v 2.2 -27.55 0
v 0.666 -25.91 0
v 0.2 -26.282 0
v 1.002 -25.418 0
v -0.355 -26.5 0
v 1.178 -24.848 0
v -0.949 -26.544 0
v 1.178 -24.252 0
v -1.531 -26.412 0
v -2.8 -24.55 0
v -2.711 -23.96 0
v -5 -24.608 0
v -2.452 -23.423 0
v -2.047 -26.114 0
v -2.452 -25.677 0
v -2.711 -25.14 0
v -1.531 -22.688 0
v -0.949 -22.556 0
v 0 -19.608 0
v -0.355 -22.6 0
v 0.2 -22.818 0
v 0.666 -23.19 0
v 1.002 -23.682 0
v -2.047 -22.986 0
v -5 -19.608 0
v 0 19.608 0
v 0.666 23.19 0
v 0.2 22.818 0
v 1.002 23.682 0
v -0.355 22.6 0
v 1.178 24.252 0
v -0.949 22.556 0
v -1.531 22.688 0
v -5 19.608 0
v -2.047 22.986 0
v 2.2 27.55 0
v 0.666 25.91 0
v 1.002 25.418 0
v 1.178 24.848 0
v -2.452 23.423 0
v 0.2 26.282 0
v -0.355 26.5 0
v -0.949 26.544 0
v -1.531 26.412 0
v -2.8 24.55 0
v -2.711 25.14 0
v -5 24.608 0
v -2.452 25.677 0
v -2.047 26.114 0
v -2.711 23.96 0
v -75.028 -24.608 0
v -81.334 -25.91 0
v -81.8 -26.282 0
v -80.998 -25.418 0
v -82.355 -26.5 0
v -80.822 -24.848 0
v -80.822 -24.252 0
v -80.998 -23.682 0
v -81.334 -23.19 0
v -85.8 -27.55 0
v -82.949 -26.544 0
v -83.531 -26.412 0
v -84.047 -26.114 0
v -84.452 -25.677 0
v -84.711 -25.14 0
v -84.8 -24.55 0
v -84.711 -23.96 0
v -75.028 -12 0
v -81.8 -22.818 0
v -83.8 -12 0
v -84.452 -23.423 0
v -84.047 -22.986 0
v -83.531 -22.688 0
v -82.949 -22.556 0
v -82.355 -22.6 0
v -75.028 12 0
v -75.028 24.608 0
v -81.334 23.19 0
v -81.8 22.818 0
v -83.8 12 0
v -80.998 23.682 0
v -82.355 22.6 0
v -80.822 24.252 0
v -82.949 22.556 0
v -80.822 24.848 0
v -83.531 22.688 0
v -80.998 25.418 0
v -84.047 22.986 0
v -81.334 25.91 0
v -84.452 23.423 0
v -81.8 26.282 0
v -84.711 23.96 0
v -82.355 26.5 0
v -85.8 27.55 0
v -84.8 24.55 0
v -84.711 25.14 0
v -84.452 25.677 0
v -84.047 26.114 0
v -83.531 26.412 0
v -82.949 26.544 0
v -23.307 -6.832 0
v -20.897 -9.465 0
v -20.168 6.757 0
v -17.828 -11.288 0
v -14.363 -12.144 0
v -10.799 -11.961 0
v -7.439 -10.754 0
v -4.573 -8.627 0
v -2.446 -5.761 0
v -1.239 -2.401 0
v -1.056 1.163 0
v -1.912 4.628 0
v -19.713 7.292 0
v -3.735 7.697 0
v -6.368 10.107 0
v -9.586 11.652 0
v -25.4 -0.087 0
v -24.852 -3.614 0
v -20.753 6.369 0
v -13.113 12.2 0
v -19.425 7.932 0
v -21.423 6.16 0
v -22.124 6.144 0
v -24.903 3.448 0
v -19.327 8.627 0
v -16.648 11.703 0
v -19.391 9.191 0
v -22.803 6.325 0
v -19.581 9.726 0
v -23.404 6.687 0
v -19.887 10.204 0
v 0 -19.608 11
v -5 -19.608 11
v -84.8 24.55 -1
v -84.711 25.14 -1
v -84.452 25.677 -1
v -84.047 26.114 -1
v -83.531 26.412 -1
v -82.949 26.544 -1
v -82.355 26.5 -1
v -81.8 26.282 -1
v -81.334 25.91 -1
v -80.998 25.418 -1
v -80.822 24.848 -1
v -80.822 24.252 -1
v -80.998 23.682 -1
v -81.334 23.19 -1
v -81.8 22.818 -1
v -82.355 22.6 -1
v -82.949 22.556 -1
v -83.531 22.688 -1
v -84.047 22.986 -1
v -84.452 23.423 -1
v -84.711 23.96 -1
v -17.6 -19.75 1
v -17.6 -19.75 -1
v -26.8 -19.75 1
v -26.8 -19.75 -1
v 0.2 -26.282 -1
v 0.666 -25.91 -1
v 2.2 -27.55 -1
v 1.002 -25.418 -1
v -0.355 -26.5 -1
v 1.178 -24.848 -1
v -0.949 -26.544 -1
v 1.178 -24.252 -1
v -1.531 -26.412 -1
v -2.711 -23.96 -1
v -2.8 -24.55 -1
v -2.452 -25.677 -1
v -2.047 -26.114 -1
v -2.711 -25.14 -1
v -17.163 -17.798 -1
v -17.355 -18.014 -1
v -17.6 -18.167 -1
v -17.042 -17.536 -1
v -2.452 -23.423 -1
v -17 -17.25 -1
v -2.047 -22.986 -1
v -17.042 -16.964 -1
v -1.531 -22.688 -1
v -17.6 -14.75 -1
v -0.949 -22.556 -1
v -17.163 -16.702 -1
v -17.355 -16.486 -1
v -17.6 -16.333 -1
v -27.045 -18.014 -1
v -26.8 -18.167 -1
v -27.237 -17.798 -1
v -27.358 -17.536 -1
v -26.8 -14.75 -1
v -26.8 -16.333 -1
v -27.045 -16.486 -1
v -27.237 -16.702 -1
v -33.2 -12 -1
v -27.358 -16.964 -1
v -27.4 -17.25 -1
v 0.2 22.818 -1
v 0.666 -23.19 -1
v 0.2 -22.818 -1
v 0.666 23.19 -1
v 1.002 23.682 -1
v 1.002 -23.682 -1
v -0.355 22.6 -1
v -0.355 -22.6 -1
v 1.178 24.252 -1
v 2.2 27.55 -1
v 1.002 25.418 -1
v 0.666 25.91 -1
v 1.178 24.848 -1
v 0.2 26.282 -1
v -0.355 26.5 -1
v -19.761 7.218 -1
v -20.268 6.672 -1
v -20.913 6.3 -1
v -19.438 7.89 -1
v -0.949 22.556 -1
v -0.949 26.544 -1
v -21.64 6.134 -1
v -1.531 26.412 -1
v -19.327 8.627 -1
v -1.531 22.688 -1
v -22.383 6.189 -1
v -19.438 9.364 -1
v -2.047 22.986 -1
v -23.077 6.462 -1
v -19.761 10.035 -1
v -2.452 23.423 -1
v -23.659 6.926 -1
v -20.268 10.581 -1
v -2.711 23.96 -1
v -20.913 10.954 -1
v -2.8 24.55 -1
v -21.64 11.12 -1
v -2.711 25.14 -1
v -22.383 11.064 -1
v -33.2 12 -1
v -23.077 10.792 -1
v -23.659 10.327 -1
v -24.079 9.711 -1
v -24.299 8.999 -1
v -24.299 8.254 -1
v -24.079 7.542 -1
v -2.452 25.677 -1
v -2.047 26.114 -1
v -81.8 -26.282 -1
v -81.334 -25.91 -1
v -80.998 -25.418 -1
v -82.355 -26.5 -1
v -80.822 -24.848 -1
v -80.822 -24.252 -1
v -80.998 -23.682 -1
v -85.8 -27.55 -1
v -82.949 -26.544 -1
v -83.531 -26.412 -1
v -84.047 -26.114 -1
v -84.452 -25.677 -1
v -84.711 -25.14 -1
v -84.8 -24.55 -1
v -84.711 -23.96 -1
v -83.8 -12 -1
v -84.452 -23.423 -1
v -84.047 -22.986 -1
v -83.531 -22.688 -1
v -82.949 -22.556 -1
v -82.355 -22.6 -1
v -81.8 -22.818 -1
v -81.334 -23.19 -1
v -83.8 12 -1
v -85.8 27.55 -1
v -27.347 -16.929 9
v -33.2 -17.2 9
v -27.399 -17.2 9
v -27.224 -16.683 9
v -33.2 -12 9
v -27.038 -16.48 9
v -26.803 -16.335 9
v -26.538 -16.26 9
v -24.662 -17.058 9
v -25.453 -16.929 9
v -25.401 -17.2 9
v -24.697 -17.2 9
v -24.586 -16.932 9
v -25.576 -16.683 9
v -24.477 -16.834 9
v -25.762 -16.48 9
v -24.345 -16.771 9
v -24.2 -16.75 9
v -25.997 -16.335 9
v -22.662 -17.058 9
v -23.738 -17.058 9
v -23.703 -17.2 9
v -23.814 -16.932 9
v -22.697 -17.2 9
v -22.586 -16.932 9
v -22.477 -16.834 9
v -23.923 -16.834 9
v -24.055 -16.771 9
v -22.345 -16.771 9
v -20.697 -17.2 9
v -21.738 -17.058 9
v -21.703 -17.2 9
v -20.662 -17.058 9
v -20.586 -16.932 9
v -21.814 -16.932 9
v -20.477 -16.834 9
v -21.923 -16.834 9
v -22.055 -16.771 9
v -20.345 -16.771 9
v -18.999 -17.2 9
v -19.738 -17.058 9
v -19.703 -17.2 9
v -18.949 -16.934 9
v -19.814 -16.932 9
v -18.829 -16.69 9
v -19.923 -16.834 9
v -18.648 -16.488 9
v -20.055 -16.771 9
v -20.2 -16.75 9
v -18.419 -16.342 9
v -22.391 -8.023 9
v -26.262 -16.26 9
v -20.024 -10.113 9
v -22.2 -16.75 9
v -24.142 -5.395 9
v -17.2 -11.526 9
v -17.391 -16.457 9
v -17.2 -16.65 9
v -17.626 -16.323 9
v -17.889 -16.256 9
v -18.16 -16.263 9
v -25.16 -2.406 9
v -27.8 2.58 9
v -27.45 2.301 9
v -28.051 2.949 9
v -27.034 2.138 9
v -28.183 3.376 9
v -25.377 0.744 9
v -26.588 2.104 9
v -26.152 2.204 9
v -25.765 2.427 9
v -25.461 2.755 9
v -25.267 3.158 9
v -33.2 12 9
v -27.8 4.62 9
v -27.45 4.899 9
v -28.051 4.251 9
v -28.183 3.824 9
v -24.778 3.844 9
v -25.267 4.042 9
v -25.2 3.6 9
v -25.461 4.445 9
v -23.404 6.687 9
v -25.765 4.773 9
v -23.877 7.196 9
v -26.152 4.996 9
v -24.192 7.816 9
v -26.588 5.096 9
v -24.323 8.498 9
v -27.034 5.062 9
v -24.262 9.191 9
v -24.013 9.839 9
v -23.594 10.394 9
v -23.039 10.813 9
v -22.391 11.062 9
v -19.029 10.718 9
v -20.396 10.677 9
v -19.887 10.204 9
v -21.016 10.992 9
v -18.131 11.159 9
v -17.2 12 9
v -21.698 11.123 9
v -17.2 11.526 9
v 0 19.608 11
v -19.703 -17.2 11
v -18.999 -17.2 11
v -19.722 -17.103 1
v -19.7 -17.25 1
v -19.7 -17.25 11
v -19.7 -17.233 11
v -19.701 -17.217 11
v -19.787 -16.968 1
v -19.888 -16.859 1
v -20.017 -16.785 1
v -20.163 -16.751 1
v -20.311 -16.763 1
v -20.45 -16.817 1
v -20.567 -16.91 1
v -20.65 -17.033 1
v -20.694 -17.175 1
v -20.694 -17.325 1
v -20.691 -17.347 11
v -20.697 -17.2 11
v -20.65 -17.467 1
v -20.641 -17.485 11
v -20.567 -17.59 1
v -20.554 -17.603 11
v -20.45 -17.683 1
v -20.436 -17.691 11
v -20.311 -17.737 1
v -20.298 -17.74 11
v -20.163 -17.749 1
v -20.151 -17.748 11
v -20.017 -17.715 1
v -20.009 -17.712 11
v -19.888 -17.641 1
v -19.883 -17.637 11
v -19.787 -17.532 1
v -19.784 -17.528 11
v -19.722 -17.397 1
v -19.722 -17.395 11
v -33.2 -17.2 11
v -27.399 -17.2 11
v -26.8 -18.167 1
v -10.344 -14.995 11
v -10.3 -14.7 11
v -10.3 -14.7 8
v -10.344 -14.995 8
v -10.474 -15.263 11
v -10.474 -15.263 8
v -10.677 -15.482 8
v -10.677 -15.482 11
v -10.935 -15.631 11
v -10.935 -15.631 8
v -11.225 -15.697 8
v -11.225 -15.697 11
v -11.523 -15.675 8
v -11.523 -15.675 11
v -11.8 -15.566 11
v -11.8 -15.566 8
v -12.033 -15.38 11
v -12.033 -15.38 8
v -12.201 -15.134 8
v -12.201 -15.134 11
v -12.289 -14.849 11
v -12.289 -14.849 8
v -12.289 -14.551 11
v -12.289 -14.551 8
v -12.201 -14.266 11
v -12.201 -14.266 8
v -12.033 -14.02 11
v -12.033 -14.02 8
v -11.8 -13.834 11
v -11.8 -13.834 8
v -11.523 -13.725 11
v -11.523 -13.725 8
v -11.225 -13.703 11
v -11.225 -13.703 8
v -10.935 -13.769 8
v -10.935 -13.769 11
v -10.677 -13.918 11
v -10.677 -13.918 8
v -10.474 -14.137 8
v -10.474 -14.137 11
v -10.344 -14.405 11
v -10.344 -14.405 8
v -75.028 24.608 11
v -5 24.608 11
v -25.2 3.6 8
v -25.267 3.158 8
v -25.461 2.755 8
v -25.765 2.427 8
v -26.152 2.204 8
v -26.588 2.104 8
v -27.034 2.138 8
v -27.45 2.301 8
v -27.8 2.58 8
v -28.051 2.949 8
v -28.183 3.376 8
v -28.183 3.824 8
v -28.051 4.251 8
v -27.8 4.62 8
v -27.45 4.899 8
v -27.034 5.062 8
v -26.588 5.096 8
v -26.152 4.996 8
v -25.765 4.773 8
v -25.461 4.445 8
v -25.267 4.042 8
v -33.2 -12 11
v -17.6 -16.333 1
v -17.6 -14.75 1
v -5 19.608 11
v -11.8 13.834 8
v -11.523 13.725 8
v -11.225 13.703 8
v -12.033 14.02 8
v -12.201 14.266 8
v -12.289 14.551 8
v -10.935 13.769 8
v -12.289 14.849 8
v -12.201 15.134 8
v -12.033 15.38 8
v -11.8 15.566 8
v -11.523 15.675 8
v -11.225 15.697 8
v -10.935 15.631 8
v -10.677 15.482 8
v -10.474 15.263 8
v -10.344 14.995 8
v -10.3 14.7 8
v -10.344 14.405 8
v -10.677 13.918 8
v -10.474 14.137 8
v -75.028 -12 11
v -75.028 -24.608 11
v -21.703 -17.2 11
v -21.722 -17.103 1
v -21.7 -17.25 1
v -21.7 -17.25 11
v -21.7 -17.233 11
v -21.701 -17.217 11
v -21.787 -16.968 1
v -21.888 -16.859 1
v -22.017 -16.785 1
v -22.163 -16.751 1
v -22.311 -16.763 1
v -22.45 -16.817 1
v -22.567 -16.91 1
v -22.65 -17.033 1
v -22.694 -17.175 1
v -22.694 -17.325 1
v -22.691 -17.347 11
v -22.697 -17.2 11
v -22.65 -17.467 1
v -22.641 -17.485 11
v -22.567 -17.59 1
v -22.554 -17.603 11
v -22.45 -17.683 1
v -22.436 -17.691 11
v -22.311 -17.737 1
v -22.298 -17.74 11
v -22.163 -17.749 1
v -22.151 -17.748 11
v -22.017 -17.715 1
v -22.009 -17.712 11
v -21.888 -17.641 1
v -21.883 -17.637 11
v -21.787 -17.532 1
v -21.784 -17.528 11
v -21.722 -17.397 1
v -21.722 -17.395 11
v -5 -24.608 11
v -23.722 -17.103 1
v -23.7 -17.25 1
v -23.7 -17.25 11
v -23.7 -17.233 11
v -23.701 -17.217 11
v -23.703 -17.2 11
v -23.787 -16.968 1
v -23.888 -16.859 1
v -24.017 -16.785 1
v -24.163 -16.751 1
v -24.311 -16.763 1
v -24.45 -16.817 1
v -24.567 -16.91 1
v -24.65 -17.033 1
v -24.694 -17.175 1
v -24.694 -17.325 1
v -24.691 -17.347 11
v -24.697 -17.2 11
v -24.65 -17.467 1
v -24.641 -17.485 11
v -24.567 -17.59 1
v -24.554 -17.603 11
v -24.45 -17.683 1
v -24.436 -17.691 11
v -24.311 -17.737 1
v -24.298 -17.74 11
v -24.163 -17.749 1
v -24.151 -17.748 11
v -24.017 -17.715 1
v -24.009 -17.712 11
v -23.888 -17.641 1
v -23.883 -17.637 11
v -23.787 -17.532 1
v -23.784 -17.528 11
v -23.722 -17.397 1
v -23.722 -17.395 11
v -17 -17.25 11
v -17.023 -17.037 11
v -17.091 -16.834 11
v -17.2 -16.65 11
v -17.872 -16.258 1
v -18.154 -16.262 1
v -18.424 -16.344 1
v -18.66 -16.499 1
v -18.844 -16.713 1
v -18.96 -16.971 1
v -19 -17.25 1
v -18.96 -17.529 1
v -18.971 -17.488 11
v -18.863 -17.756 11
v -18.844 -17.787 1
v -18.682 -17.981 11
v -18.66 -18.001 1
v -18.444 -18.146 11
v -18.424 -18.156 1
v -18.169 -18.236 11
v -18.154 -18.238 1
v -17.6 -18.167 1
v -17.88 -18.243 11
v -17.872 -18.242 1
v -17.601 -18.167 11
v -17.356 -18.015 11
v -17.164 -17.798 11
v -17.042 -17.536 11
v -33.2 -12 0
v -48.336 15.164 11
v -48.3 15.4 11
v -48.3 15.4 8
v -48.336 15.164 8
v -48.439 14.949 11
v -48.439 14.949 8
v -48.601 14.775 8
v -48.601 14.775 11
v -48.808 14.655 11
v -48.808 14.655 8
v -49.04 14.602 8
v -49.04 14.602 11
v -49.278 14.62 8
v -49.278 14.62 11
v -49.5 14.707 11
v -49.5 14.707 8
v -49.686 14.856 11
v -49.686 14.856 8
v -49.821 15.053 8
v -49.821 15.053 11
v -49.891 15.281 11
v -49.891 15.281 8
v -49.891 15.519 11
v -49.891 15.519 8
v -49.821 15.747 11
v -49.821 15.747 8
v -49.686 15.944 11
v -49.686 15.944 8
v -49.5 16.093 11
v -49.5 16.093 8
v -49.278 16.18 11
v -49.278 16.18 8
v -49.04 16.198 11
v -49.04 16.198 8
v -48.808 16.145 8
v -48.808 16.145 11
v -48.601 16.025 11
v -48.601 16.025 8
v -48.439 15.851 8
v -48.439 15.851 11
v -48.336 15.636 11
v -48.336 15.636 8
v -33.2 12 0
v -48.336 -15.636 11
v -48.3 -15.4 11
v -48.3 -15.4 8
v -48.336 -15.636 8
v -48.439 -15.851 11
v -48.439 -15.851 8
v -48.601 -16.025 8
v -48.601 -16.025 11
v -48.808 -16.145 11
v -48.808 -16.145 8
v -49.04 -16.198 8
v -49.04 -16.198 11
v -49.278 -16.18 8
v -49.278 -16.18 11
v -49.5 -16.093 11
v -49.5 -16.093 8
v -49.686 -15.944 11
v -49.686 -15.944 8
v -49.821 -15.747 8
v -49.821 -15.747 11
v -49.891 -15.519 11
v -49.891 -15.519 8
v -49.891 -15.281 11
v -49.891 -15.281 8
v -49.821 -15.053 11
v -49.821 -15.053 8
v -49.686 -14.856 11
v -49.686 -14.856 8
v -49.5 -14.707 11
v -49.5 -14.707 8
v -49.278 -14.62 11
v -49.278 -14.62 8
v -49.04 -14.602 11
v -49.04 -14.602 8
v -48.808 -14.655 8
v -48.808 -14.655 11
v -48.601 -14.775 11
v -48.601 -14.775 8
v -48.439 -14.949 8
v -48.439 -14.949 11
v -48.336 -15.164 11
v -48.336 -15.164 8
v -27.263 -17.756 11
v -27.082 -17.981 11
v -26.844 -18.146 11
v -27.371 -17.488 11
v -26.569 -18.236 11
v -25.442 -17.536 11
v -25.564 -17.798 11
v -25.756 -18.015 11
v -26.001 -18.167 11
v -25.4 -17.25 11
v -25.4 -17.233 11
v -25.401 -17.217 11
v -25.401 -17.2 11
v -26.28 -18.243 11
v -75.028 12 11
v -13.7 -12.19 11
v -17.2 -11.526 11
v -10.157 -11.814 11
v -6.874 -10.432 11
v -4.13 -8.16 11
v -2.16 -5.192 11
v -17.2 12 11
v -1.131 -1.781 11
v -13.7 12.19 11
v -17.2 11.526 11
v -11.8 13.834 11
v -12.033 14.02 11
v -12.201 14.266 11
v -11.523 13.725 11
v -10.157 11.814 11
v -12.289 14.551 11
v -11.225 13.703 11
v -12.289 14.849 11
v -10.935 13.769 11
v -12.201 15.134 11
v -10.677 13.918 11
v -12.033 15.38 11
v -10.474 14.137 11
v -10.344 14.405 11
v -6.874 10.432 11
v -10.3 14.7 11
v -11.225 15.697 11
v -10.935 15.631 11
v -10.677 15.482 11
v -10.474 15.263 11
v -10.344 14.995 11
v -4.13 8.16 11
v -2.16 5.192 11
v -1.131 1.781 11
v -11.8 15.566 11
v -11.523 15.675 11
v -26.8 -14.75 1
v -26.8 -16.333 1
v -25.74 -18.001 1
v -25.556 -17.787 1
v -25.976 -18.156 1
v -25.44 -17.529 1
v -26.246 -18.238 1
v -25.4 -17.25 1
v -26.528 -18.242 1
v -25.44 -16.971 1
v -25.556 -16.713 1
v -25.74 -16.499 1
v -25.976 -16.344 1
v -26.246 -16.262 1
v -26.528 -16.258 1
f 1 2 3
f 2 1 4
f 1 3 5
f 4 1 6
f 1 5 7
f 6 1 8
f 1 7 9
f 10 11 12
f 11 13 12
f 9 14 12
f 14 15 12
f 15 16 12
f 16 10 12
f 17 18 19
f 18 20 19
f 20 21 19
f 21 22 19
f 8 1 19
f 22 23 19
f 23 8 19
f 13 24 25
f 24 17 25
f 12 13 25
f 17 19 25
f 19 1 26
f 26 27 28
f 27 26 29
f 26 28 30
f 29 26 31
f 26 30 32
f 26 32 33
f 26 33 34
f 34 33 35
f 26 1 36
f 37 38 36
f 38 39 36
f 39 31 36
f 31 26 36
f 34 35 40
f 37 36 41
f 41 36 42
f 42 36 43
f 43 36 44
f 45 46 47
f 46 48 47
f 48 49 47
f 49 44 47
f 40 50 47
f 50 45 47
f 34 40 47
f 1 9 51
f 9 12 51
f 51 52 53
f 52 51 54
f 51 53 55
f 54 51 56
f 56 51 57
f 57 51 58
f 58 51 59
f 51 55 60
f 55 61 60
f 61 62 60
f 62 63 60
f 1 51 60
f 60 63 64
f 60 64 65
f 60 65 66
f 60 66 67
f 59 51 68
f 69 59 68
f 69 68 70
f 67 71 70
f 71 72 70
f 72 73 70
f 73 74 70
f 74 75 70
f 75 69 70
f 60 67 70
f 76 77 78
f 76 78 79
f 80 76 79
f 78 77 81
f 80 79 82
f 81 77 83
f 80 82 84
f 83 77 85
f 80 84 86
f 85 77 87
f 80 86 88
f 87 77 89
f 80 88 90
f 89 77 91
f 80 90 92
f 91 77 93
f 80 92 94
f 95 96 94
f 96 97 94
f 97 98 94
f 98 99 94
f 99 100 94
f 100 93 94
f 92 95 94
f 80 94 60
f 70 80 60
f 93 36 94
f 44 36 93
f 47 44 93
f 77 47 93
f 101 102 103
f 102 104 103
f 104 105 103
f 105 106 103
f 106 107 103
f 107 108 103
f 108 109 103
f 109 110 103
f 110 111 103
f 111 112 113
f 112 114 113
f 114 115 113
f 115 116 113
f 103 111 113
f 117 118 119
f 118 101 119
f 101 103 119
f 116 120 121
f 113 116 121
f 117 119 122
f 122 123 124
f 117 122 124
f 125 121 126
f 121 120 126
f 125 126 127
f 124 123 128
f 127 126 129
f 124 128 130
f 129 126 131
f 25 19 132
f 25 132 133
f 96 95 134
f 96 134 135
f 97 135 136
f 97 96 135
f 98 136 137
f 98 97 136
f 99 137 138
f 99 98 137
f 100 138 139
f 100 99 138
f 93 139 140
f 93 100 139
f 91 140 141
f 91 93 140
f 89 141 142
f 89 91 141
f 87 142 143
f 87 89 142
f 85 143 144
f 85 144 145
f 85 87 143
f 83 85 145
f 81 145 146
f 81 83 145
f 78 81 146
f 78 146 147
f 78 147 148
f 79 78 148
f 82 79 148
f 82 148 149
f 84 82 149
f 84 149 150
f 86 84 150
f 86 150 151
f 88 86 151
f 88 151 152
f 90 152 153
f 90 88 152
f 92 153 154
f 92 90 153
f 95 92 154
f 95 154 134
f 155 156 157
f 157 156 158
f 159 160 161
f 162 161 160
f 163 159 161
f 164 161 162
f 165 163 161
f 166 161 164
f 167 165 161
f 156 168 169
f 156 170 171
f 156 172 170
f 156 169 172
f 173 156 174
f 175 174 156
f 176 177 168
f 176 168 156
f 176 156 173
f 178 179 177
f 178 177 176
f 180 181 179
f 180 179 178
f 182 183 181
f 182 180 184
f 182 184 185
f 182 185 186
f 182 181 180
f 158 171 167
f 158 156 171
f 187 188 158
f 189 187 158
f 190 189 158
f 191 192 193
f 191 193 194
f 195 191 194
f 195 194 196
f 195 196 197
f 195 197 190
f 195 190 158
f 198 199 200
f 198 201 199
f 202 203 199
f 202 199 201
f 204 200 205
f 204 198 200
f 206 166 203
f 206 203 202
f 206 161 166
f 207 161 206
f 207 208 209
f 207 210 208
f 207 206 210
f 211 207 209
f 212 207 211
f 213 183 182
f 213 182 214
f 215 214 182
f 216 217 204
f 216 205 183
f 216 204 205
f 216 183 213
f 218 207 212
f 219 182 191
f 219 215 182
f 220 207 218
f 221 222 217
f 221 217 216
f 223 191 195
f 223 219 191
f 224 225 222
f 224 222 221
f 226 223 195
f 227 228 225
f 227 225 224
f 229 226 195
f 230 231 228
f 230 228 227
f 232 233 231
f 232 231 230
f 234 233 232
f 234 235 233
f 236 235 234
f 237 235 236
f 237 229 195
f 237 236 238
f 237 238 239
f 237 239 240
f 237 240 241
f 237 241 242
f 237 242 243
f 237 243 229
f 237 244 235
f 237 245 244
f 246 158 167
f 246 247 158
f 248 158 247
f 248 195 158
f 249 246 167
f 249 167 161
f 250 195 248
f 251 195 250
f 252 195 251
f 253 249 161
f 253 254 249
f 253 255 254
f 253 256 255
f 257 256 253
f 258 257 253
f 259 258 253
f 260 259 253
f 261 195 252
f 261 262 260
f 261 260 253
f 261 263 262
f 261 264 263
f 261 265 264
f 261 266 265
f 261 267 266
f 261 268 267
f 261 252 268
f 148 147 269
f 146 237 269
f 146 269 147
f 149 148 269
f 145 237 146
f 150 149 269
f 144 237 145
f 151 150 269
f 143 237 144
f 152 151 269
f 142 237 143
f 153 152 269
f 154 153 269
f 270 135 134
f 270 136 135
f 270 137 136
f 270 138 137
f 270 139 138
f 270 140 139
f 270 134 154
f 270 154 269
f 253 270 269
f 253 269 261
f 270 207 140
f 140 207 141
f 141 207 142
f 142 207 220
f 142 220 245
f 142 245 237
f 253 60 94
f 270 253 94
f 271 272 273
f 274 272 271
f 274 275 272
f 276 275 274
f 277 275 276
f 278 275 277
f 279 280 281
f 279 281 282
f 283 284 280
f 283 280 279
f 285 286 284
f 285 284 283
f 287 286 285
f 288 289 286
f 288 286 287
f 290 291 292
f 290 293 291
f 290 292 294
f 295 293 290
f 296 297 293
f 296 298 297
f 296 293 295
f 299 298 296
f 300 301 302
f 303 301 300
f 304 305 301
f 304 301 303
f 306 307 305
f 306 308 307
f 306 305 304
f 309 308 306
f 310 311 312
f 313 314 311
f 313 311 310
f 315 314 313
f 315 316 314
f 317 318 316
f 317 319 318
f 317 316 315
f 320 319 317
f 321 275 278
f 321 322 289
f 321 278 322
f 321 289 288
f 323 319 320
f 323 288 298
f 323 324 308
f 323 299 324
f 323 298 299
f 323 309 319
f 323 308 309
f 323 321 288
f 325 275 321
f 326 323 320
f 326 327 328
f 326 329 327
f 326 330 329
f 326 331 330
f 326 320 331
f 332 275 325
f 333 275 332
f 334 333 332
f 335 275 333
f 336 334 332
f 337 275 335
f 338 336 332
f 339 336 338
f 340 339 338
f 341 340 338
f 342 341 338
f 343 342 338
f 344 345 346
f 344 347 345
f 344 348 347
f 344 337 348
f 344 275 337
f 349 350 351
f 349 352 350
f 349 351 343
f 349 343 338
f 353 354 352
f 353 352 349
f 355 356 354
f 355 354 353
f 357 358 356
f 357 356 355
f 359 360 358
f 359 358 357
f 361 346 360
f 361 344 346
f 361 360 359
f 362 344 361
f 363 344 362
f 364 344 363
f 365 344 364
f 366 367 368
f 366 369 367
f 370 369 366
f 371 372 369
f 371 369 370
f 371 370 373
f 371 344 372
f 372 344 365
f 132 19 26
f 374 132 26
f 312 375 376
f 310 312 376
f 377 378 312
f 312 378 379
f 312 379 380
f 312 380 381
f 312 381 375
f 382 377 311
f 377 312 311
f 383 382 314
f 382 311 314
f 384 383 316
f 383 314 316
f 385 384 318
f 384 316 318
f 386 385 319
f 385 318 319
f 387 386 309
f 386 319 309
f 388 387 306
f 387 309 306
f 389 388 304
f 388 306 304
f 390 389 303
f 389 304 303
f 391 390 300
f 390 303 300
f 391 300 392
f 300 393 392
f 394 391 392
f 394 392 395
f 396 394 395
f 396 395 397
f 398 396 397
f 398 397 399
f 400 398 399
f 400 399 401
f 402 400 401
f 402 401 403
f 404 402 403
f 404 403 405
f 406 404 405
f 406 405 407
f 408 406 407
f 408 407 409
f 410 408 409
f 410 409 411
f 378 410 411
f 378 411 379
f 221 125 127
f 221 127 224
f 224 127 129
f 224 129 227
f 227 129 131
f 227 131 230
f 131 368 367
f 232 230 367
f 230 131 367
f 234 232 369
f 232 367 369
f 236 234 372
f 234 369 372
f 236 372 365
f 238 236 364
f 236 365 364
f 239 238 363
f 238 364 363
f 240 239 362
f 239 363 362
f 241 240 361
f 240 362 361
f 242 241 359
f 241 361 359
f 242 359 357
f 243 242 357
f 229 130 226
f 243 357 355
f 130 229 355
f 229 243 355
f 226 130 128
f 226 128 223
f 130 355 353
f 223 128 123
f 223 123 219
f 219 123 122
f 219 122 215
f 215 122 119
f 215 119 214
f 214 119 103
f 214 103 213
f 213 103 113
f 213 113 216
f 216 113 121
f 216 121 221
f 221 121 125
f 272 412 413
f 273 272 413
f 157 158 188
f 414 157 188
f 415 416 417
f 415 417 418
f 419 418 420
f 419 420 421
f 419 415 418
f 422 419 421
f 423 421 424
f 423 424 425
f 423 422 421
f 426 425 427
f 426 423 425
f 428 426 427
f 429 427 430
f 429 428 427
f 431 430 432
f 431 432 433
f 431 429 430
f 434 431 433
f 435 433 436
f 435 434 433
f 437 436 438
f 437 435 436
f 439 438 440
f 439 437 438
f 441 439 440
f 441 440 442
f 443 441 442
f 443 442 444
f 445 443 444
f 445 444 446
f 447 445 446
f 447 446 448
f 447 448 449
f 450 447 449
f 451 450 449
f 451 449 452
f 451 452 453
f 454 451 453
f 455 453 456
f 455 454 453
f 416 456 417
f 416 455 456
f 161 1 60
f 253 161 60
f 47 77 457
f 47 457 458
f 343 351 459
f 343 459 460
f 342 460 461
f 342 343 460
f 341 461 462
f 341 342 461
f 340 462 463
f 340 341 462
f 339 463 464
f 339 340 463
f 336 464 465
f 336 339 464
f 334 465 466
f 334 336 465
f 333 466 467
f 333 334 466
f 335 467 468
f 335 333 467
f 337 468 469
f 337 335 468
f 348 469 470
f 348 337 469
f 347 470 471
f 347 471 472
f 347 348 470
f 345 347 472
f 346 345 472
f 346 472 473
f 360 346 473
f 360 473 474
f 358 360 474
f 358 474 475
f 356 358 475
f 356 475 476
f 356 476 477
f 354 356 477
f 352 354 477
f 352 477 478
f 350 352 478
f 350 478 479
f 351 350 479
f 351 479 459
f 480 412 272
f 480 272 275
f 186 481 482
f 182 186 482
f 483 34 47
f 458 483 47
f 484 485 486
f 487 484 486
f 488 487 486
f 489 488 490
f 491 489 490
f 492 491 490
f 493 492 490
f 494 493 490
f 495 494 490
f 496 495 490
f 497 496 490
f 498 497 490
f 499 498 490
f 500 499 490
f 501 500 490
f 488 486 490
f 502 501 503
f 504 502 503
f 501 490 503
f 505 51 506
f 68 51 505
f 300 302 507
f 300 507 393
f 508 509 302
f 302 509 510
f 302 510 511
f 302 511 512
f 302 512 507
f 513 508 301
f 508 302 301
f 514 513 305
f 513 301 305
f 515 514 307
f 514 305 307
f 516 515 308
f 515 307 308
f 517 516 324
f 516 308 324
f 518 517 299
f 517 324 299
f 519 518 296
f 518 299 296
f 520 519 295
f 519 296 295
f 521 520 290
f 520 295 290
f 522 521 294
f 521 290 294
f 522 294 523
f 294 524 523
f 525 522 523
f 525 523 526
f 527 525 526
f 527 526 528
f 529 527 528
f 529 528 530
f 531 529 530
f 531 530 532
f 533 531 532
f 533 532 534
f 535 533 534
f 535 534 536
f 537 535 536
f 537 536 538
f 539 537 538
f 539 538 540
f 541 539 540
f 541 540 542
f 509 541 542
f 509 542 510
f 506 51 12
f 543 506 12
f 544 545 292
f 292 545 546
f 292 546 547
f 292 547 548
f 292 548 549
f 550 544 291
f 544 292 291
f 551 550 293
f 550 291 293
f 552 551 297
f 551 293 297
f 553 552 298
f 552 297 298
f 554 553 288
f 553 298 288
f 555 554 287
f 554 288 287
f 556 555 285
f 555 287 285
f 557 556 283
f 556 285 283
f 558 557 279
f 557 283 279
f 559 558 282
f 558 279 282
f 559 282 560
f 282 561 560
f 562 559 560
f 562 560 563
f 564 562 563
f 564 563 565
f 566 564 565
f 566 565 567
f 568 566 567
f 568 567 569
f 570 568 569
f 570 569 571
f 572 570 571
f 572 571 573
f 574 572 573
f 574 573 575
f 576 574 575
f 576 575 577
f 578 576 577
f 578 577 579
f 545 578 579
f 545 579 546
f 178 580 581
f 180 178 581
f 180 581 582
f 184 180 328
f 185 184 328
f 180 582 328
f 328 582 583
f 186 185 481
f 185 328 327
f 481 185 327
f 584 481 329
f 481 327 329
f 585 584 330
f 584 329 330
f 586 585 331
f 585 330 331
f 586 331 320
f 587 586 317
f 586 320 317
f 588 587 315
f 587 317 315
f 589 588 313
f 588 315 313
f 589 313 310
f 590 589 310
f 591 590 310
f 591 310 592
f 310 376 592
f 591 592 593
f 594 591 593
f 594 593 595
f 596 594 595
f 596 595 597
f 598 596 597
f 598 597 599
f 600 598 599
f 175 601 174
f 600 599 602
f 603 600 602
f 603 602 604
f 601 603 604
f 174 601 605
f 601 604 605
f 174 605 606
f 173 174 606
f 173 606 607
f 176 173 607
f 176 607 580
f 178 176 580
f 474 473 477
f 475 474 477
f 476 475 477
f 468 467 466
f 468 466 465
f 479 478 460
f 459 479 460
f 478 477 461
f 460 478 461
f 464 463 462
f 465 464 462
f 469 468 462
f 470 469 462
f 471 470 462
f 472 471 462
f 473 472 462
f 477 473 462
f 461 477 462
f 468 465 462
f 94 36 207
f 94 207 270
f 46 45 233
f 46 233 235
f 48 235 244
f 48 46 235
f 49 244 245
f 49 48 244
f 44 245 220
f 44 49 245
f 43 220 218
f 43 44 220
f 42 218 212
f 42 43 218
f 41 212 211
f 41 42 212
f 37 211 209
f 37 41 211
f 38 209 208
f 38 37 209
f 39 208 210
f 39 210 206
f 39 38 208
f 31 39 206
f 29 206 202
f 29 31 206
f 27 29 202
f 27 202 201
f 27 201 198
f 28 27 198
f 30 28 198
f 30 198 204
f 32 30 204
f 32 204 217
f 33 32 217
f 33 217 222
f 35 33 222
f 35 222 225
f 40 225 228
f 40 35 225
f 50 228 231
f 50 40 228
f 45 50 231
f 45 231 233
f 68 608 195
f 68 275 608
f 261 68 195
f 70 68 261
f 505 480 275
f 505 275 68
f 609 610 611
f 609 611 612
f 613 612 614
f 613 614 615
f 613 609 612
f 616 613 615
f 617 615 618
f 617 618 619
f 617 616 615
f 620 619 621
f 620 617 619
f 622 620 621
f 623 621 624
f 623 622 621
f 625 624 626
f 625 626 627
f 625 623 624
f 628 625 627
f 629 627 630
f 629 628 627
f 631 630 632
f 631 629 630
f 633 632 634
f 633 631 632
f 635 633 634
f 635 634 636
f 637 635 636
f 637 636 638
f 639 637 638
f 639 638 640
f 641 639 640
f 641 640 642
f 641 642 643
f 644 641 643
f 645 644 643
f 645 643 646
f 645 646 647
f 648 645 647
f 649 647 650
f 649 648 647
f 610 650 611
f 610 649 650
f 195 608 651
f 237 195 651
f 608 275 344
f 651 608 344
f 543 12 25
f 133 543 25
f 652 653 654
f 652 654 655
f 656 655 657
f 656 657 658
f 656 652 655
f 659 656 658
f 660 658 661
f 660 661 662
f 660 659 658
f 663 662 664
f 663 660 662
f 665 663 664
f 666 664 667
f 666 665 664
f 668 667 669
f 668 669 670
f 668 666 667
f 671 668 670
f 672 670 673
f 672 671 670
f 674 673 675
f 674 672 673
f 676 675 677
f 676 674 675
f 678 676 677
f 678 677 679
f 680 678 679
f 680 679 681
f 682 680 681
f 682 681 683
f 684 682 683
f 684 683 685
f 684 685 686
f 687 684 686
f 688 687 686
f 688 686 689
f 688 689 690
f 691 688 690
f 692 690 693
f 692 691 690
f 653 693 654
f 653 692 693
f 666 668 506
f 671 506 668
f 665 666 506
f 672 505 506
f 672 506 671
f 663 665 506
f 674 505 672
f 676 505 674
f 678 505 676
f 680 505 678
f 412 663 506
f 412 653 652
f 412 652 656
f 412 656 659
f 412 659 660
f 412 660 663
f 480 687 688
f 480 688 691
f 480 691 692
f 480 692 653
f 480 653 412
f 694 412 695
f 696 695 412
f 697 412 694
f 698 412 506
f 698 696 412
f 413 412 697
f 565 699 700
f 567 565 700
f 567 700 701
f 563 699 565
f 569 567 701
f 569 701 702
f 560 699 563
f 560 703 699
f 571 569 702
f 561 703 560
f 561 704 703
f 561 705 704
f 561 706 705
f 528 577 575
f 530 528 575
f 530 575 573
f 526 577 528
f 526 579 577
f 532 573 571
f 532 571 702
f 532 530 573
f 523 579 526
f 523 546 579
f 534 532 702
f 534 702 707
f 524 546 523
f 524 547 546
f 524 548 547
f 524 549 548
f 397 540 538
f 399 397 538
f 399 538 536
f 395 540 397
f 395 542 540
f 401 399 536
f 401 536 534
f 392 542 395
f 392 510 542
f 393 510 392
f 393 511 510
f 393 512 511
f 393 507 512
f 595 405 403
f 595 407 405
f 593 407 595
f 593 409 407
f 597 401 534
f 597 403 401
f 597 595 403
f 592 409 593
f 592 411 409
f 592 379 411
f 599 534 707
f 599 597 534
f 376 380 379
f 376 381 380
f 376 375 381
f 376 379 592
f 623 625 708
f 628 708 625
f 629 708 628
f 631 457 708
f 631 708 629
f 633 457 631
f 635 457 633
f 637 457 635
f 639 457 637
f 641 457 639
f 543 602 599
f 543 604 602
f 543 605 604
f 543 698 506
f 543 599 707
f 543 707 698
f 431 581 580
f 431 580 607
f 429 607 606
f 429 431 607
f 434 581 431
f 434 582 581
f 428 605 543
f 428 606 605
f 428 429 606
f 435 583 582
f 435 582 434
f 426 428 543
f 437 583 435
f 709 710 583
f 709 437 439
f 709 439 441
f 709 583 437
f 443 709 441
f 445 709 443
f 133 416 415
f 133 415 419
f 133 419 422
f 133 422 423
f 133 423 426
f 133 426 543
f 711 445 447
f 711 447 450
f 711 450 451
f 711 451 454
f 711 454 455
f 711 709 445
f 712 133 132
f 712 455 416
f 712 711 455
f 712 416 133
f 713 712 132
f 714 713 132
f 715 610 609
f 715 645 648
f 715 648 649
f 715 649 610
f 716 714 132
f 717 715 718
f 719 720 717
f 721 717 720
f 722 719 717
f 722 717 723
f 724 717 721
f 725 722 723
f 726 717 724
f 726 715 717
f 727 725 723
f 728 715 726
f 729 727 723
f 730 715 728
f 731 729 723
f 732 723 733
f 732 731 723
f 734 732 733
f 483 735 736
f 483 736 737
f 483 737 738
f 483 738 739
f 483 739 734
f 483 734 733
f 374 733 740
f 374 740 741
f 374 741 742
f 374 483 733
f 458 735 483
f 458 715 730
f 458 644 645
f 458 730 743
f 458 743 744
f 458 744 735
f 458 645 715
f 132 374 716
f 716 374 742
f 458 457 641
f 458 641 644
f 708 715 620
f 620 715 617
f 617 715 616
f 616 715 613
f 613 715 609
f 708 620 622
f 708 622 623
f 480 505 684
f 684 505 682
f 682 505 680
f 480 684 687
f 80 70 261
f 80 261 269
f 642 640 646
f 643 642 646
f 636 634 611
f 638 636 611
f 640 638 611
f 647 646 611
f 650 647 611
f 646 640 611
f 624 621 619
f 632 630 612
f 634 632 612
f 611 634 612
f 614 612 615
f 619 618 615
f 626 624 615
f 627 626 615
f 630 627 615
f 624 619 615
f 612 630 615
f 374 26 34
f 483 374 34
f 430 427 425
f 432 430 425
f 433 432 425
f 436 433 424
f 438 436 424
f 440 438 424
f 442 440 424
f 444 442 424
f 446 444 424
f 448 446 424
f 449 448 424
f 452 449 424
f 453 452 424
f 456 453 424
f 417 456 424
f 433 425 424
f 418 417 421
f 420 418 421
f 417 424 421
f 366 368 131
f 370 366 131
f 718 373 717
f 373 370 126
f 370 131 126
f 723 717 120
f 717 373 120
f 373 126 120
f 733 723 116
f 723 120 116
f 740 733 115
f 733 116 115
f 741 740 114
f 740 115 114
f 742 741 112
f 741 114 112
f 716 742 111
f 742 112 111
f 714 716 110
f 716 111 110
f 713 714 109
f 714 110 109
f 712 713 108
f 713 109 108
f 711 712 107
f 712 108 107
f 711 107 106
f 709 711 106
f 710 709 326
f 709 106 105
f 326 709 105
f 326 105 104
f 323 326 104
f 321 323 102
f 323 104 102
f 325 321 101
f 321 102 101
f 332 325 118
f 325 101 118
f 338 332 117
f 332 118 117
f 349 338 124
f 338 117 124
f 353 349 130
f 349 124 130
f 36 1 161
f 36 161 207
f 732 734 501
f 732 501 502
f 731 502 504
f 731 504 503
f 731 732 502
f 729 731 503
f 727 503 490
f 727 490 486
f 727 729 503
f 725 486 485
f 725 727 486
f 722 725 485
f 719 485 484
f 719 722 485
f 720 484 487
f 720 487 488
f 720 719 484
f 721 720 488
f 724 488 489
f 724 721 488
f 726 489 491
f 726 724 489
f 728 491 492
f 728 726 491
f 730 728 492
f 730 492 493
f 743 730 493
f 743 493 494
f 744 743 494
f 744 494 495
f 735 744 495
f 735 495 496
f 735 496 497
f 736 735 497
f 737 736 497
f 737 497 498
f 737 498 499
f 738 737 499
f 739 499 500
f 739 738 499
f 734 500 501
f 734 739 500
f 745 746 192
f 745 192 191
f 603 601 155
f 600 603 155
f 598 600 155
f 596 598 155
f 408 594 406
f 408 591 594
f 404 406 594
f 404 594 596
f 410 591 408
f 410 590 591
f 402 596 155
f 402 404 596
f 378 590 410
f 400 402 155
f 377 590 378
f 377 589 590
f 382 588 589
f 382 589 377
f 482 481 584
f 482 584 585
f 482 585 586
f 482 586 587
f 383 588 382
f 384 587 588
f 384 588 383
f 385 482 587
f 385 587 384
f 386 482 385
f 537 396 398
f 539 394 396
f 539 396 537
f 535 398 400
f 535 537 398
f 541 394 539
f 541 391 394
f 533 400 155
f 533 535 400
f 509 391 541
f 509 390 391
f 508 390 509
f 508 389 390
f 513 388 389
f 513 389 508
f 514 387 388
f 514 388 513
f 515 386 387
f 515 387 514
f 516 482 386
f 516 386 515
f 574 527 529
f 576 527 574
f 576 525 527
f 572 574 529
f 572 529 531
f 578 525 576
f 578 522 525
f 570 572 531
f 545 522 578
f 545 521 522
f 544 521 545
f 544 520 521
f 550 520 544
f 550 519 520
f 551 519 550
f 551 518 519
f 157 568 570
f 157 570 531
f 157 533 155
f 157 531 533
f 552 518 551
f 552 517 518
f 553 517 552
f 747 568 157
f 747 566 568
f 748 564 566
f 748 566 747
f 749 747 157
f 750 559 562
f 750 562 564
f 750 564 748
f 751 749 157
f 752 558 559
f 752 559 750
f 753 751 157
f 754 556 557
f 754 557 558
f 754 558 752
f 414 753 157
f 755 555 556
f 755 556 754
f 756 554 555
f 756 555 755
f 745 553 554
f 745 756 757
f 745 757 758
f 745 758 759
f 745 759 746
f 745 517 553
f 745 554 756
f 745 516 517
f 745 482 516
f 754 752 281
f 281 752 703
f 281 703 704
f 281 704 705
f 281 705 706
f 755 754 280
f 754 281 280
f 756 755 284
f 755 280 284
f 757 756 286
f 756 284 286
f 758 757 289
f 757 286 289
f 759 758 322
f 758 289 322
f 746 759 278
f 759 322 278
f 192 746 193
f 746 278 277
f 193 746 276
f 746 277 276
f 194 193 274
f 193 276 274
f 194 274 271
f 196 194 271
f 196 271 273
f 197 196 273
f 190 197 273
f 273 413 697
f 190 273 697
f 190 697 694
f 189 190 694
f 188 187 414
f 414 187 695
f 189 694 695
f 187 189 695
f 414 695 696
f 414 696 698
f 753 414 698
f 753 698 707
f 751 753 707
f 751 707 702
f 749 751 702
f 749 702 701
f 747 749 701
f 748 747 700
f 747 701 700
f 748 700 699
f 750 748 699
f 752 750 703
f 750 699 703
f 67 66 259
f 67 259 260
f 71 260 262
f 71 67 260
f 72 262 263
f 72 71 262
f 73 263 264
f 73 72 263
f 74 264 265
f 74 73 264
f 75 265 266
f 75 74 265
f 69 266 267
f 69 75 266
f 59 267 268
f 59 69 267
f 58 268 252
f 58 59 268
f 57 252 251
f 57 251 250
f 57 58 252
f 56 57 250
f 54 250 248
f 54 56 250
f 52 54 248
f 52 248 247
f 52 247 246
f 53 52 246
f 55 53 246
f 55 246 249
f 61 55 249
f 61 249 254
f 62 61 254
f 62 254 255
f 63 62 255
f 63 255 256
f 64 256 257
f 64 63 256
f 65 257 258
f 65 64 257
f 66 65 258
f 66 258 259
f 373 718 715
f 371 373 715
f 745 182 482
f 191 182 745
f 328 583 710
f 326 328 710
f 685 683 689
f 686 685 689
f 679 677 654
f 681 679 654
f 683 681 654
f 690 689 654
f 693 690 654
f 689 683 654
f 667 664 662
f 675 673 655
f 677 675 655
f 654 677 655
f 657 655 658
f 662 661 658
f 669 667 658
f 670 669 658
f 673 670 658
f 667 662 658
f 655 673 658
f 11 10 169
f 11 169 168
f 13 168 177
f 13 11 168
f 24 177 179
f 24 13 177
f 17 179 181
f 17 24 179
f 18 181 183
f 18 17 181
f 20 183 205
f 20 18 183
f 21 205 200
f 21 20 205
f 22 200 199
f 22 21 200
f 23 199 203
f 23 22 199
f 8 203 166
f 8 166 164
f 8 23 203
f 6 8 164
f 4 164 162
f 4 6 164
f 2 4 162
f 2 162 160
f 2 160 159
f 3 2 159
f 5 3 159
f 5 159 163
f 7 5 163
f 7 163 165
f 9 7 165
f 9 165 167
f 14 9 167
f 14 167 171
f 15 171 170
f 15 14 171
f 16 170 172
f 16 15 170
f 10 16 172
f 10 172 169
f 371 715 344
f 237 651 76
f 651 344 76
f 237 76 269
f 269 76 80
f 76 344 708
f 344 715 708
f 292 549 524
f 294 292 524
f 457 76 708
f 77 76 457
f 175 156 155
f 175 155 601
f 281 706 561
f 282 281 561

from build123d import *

# Parameters (mm, degrees)
SKETCH_1_W          = 75.027591161
SKETCH_1_H          = 49.216029974
EXTRUDE_1_DEPTH     = 11
CUT_EXTRUDE_START   = -11
SKETCH_2_R          = 1
SKETCH_2_R_2        = 1.5
SKETCH_2_R_3        = 0.8
CUT_EXTRUDE_1_DEPTH = 3
SKETCH_2_4_R        = 12.2
SKETCH_2_4_W        = 5
SKETCH_2_4_H        = 5
SKETCH_2_4_W_2      = 41.827591161
SKETCH_2_4_H_2      = 24
CUT_EXTRUDE_3_DEPTH = 80.722605558
SKETCH_4_W          = 88
SKETCH_4_H          = 55.1
SKETCH_4_R          = 2
SKETCH_4_W_2        = 50.6
SKETCH_4_H_2        = 24
EXTRUDE_2_DEPTH     = 1
SKETCH_5_R          = 2.5
CUT_EXTRUDE_4_DEPTH = 91.910079199
SKETCH_7_W          = 9.2
SKETCH_7_H          = 5
CUT_EXTRUDE_6_DEPTH = 2
SKETCH_8_R          = 1
SKETCH_8_R_2        = 0.5
CUT_EXTRUDE_7_DEPTH = 91.910079199
SKETCH_9_W          = 16
SKETCH_9_H          = 29.2
CUT_EXTRUDE_8_DEPTH = 2


with BuildPart() as part:
    # 草图1 → 凸台-拉伸1 (new body)
    with BuildSketch(Plane.XY):
        with Locations((-37.513795581, 0)):
            Rectangle(SKETCH_1_W, SKETCH_1_H)
    extrude(amount=EXTRUDE_1_DEPTH)

    # 草图2 → 切除-拉伸1 (cut)
    with BuildSketch(Plane(origin=(0, 0, 0), x_dir=(-1, 0, 0), z_dir=(0, 0, -1)).offset(CUT_EXTRUDE_START)):
        with Locations(Location((11.3, 14.7, 0), (0, 0, 180))):
            Circle(SKETCH_2_R)
        with Locations(Location((11.3, -14.7, 0), (0, 0, 180))):
            Circle(SKETCH_2_R)
        with Locations(Location((26.7, 3.6, 0), (0, 0, 180))):
            Circle(SKETCH_2_R_2)
        with Locations(Location((49.1, 15.4, 0), (0, 0, 180))):
            Circle(SKETCH_2_R_3)
        with Locations(Location((49.1, -15.4, 0), (0, 0, 180))):
            Circle(SKETCH_2_R_3)
    extrude(amount=CUT_EXTRUDE_1_DEPTH, mode=Mode.SUBTRACT)

    # 草图2<4> → 切除-拉伸3 (cut, through all)
    with BuildSketch(Plane(origin=(0, 0, 0), x_dir=(-1, 0, 0), z_dir=(0, 0, -1))):
        with Locations((13.2, 0)):
            Circle(SKETCH_2_4_R)
        with Locations((2.5, 22.108014987)):
            Rectangle(SKETCH_2_4_W, SKETCH_2_4_H)
        with Locations((2.5, -22.108014987)):
            Rectangle(SKETCH_2_4_W, SKETCH_2_4_H)
        with Locations((54.113795581, 0)):
            Rectangle(SKETCH_2_4_W_2, SKETCH_2_4_H_2)
    extrude(amount=-CUT_EXTRUDE_3_DEPTH, mode=Mode.SUBTRACT)

    # 草图4 → 凸台-拉伸2 (add)
    with BuildSketch(Plane(origin=(0, 0, 0), x_dir=(-1, 0, 0), z_dir=(0, 0, -1))):
        with Locations((41.8, 0)):
            Rectangle(SKETCH_4_W, SKETCH_4_H)
        with Locations((0.8, 24.55)):
            Circle(SKETCH_4_R, mode=Mode.SUBTRACT)
        with Locations((0.8, -24.55)):
            Circle(SKETCH_4_R, mode=Mode.SUBTRACT)
        with Locations((82.8, -24.55)):
            Circle(SKETCH_4_R, mode=Mode.SUBTRACT)
        with Locations((82.8, 24.55)):
            Circle(SKETCH_4_R, mode=Mode.SUBTRACT)
        with Locations((58.5, 0)):
            Rectangle(SKETCH_4_W_2, SKETCH_4_H_2, mode=Mode.SUBTRACT)
    extrude(amount=EXTRUDE_2_DEPTH)

    # 草图5 → 切除-拉伸4 (cut, through all)
    with BuildSketch(Plane.XY.offset(11)):
        with Locations((-21.82670273, 8.62670273)):
            Circle(SKETCH_5_R)
    extrude(amount=-CUT_EXTRUDE_4_DEPTH, mode=Mode.SUBTRACT)

    # 草图7 → 切除-拉伸6 (cut)
    with BuildSketch(Plane(origin=(0, 0, -1), x_dir=(-1, 0, 0), z_dir=(0, 0, -1))):
        with Locations((22.2, -17.25)):
            Rectangle(SKETCH_7_W, SKETCH_7_H)
    extrude(amount=-CUT_EXTRUDE_6_DEPTH, mode=Mode.SUBTRACT)

    # 草图8 → 切除-拉伸7 (cut, through all)
    with BuildSketch(Plane.XY.offset(11)):
        with Locations((-26.4, -17.25)):
            Circle(SKETCH_8_R)
        with Locations((-24.2, -17.25)):
            Circle(SKETCH_8_R_2)
        with Locations((-22.2, -17.25)):
            Circle(SKETCH_8_R_2)
        with Locations((-20.2, -17.25)):
            Circle(SKETCH_8_R_2)
        with Locations((-18, -17.25)):
            Circle(SKETCH_8_R)
    extrude(amount=-CUT_EXTRUDE_7_DEPTH, mode=Mode.SUBTRACT)

    # 草图9 → 切除-拉伸8 (cut)
    with BuildSketch(Plane.XY.offset(11)):
        with Locations((-25.2, -2.6)):
            Rectangle(SKETCH_9_W, SKETCH_9_H)
    extrude(amount=-CUT_EXTRUDE_8_DEPTH, mode=Mode.SUBTRACT)


solid = part.part
